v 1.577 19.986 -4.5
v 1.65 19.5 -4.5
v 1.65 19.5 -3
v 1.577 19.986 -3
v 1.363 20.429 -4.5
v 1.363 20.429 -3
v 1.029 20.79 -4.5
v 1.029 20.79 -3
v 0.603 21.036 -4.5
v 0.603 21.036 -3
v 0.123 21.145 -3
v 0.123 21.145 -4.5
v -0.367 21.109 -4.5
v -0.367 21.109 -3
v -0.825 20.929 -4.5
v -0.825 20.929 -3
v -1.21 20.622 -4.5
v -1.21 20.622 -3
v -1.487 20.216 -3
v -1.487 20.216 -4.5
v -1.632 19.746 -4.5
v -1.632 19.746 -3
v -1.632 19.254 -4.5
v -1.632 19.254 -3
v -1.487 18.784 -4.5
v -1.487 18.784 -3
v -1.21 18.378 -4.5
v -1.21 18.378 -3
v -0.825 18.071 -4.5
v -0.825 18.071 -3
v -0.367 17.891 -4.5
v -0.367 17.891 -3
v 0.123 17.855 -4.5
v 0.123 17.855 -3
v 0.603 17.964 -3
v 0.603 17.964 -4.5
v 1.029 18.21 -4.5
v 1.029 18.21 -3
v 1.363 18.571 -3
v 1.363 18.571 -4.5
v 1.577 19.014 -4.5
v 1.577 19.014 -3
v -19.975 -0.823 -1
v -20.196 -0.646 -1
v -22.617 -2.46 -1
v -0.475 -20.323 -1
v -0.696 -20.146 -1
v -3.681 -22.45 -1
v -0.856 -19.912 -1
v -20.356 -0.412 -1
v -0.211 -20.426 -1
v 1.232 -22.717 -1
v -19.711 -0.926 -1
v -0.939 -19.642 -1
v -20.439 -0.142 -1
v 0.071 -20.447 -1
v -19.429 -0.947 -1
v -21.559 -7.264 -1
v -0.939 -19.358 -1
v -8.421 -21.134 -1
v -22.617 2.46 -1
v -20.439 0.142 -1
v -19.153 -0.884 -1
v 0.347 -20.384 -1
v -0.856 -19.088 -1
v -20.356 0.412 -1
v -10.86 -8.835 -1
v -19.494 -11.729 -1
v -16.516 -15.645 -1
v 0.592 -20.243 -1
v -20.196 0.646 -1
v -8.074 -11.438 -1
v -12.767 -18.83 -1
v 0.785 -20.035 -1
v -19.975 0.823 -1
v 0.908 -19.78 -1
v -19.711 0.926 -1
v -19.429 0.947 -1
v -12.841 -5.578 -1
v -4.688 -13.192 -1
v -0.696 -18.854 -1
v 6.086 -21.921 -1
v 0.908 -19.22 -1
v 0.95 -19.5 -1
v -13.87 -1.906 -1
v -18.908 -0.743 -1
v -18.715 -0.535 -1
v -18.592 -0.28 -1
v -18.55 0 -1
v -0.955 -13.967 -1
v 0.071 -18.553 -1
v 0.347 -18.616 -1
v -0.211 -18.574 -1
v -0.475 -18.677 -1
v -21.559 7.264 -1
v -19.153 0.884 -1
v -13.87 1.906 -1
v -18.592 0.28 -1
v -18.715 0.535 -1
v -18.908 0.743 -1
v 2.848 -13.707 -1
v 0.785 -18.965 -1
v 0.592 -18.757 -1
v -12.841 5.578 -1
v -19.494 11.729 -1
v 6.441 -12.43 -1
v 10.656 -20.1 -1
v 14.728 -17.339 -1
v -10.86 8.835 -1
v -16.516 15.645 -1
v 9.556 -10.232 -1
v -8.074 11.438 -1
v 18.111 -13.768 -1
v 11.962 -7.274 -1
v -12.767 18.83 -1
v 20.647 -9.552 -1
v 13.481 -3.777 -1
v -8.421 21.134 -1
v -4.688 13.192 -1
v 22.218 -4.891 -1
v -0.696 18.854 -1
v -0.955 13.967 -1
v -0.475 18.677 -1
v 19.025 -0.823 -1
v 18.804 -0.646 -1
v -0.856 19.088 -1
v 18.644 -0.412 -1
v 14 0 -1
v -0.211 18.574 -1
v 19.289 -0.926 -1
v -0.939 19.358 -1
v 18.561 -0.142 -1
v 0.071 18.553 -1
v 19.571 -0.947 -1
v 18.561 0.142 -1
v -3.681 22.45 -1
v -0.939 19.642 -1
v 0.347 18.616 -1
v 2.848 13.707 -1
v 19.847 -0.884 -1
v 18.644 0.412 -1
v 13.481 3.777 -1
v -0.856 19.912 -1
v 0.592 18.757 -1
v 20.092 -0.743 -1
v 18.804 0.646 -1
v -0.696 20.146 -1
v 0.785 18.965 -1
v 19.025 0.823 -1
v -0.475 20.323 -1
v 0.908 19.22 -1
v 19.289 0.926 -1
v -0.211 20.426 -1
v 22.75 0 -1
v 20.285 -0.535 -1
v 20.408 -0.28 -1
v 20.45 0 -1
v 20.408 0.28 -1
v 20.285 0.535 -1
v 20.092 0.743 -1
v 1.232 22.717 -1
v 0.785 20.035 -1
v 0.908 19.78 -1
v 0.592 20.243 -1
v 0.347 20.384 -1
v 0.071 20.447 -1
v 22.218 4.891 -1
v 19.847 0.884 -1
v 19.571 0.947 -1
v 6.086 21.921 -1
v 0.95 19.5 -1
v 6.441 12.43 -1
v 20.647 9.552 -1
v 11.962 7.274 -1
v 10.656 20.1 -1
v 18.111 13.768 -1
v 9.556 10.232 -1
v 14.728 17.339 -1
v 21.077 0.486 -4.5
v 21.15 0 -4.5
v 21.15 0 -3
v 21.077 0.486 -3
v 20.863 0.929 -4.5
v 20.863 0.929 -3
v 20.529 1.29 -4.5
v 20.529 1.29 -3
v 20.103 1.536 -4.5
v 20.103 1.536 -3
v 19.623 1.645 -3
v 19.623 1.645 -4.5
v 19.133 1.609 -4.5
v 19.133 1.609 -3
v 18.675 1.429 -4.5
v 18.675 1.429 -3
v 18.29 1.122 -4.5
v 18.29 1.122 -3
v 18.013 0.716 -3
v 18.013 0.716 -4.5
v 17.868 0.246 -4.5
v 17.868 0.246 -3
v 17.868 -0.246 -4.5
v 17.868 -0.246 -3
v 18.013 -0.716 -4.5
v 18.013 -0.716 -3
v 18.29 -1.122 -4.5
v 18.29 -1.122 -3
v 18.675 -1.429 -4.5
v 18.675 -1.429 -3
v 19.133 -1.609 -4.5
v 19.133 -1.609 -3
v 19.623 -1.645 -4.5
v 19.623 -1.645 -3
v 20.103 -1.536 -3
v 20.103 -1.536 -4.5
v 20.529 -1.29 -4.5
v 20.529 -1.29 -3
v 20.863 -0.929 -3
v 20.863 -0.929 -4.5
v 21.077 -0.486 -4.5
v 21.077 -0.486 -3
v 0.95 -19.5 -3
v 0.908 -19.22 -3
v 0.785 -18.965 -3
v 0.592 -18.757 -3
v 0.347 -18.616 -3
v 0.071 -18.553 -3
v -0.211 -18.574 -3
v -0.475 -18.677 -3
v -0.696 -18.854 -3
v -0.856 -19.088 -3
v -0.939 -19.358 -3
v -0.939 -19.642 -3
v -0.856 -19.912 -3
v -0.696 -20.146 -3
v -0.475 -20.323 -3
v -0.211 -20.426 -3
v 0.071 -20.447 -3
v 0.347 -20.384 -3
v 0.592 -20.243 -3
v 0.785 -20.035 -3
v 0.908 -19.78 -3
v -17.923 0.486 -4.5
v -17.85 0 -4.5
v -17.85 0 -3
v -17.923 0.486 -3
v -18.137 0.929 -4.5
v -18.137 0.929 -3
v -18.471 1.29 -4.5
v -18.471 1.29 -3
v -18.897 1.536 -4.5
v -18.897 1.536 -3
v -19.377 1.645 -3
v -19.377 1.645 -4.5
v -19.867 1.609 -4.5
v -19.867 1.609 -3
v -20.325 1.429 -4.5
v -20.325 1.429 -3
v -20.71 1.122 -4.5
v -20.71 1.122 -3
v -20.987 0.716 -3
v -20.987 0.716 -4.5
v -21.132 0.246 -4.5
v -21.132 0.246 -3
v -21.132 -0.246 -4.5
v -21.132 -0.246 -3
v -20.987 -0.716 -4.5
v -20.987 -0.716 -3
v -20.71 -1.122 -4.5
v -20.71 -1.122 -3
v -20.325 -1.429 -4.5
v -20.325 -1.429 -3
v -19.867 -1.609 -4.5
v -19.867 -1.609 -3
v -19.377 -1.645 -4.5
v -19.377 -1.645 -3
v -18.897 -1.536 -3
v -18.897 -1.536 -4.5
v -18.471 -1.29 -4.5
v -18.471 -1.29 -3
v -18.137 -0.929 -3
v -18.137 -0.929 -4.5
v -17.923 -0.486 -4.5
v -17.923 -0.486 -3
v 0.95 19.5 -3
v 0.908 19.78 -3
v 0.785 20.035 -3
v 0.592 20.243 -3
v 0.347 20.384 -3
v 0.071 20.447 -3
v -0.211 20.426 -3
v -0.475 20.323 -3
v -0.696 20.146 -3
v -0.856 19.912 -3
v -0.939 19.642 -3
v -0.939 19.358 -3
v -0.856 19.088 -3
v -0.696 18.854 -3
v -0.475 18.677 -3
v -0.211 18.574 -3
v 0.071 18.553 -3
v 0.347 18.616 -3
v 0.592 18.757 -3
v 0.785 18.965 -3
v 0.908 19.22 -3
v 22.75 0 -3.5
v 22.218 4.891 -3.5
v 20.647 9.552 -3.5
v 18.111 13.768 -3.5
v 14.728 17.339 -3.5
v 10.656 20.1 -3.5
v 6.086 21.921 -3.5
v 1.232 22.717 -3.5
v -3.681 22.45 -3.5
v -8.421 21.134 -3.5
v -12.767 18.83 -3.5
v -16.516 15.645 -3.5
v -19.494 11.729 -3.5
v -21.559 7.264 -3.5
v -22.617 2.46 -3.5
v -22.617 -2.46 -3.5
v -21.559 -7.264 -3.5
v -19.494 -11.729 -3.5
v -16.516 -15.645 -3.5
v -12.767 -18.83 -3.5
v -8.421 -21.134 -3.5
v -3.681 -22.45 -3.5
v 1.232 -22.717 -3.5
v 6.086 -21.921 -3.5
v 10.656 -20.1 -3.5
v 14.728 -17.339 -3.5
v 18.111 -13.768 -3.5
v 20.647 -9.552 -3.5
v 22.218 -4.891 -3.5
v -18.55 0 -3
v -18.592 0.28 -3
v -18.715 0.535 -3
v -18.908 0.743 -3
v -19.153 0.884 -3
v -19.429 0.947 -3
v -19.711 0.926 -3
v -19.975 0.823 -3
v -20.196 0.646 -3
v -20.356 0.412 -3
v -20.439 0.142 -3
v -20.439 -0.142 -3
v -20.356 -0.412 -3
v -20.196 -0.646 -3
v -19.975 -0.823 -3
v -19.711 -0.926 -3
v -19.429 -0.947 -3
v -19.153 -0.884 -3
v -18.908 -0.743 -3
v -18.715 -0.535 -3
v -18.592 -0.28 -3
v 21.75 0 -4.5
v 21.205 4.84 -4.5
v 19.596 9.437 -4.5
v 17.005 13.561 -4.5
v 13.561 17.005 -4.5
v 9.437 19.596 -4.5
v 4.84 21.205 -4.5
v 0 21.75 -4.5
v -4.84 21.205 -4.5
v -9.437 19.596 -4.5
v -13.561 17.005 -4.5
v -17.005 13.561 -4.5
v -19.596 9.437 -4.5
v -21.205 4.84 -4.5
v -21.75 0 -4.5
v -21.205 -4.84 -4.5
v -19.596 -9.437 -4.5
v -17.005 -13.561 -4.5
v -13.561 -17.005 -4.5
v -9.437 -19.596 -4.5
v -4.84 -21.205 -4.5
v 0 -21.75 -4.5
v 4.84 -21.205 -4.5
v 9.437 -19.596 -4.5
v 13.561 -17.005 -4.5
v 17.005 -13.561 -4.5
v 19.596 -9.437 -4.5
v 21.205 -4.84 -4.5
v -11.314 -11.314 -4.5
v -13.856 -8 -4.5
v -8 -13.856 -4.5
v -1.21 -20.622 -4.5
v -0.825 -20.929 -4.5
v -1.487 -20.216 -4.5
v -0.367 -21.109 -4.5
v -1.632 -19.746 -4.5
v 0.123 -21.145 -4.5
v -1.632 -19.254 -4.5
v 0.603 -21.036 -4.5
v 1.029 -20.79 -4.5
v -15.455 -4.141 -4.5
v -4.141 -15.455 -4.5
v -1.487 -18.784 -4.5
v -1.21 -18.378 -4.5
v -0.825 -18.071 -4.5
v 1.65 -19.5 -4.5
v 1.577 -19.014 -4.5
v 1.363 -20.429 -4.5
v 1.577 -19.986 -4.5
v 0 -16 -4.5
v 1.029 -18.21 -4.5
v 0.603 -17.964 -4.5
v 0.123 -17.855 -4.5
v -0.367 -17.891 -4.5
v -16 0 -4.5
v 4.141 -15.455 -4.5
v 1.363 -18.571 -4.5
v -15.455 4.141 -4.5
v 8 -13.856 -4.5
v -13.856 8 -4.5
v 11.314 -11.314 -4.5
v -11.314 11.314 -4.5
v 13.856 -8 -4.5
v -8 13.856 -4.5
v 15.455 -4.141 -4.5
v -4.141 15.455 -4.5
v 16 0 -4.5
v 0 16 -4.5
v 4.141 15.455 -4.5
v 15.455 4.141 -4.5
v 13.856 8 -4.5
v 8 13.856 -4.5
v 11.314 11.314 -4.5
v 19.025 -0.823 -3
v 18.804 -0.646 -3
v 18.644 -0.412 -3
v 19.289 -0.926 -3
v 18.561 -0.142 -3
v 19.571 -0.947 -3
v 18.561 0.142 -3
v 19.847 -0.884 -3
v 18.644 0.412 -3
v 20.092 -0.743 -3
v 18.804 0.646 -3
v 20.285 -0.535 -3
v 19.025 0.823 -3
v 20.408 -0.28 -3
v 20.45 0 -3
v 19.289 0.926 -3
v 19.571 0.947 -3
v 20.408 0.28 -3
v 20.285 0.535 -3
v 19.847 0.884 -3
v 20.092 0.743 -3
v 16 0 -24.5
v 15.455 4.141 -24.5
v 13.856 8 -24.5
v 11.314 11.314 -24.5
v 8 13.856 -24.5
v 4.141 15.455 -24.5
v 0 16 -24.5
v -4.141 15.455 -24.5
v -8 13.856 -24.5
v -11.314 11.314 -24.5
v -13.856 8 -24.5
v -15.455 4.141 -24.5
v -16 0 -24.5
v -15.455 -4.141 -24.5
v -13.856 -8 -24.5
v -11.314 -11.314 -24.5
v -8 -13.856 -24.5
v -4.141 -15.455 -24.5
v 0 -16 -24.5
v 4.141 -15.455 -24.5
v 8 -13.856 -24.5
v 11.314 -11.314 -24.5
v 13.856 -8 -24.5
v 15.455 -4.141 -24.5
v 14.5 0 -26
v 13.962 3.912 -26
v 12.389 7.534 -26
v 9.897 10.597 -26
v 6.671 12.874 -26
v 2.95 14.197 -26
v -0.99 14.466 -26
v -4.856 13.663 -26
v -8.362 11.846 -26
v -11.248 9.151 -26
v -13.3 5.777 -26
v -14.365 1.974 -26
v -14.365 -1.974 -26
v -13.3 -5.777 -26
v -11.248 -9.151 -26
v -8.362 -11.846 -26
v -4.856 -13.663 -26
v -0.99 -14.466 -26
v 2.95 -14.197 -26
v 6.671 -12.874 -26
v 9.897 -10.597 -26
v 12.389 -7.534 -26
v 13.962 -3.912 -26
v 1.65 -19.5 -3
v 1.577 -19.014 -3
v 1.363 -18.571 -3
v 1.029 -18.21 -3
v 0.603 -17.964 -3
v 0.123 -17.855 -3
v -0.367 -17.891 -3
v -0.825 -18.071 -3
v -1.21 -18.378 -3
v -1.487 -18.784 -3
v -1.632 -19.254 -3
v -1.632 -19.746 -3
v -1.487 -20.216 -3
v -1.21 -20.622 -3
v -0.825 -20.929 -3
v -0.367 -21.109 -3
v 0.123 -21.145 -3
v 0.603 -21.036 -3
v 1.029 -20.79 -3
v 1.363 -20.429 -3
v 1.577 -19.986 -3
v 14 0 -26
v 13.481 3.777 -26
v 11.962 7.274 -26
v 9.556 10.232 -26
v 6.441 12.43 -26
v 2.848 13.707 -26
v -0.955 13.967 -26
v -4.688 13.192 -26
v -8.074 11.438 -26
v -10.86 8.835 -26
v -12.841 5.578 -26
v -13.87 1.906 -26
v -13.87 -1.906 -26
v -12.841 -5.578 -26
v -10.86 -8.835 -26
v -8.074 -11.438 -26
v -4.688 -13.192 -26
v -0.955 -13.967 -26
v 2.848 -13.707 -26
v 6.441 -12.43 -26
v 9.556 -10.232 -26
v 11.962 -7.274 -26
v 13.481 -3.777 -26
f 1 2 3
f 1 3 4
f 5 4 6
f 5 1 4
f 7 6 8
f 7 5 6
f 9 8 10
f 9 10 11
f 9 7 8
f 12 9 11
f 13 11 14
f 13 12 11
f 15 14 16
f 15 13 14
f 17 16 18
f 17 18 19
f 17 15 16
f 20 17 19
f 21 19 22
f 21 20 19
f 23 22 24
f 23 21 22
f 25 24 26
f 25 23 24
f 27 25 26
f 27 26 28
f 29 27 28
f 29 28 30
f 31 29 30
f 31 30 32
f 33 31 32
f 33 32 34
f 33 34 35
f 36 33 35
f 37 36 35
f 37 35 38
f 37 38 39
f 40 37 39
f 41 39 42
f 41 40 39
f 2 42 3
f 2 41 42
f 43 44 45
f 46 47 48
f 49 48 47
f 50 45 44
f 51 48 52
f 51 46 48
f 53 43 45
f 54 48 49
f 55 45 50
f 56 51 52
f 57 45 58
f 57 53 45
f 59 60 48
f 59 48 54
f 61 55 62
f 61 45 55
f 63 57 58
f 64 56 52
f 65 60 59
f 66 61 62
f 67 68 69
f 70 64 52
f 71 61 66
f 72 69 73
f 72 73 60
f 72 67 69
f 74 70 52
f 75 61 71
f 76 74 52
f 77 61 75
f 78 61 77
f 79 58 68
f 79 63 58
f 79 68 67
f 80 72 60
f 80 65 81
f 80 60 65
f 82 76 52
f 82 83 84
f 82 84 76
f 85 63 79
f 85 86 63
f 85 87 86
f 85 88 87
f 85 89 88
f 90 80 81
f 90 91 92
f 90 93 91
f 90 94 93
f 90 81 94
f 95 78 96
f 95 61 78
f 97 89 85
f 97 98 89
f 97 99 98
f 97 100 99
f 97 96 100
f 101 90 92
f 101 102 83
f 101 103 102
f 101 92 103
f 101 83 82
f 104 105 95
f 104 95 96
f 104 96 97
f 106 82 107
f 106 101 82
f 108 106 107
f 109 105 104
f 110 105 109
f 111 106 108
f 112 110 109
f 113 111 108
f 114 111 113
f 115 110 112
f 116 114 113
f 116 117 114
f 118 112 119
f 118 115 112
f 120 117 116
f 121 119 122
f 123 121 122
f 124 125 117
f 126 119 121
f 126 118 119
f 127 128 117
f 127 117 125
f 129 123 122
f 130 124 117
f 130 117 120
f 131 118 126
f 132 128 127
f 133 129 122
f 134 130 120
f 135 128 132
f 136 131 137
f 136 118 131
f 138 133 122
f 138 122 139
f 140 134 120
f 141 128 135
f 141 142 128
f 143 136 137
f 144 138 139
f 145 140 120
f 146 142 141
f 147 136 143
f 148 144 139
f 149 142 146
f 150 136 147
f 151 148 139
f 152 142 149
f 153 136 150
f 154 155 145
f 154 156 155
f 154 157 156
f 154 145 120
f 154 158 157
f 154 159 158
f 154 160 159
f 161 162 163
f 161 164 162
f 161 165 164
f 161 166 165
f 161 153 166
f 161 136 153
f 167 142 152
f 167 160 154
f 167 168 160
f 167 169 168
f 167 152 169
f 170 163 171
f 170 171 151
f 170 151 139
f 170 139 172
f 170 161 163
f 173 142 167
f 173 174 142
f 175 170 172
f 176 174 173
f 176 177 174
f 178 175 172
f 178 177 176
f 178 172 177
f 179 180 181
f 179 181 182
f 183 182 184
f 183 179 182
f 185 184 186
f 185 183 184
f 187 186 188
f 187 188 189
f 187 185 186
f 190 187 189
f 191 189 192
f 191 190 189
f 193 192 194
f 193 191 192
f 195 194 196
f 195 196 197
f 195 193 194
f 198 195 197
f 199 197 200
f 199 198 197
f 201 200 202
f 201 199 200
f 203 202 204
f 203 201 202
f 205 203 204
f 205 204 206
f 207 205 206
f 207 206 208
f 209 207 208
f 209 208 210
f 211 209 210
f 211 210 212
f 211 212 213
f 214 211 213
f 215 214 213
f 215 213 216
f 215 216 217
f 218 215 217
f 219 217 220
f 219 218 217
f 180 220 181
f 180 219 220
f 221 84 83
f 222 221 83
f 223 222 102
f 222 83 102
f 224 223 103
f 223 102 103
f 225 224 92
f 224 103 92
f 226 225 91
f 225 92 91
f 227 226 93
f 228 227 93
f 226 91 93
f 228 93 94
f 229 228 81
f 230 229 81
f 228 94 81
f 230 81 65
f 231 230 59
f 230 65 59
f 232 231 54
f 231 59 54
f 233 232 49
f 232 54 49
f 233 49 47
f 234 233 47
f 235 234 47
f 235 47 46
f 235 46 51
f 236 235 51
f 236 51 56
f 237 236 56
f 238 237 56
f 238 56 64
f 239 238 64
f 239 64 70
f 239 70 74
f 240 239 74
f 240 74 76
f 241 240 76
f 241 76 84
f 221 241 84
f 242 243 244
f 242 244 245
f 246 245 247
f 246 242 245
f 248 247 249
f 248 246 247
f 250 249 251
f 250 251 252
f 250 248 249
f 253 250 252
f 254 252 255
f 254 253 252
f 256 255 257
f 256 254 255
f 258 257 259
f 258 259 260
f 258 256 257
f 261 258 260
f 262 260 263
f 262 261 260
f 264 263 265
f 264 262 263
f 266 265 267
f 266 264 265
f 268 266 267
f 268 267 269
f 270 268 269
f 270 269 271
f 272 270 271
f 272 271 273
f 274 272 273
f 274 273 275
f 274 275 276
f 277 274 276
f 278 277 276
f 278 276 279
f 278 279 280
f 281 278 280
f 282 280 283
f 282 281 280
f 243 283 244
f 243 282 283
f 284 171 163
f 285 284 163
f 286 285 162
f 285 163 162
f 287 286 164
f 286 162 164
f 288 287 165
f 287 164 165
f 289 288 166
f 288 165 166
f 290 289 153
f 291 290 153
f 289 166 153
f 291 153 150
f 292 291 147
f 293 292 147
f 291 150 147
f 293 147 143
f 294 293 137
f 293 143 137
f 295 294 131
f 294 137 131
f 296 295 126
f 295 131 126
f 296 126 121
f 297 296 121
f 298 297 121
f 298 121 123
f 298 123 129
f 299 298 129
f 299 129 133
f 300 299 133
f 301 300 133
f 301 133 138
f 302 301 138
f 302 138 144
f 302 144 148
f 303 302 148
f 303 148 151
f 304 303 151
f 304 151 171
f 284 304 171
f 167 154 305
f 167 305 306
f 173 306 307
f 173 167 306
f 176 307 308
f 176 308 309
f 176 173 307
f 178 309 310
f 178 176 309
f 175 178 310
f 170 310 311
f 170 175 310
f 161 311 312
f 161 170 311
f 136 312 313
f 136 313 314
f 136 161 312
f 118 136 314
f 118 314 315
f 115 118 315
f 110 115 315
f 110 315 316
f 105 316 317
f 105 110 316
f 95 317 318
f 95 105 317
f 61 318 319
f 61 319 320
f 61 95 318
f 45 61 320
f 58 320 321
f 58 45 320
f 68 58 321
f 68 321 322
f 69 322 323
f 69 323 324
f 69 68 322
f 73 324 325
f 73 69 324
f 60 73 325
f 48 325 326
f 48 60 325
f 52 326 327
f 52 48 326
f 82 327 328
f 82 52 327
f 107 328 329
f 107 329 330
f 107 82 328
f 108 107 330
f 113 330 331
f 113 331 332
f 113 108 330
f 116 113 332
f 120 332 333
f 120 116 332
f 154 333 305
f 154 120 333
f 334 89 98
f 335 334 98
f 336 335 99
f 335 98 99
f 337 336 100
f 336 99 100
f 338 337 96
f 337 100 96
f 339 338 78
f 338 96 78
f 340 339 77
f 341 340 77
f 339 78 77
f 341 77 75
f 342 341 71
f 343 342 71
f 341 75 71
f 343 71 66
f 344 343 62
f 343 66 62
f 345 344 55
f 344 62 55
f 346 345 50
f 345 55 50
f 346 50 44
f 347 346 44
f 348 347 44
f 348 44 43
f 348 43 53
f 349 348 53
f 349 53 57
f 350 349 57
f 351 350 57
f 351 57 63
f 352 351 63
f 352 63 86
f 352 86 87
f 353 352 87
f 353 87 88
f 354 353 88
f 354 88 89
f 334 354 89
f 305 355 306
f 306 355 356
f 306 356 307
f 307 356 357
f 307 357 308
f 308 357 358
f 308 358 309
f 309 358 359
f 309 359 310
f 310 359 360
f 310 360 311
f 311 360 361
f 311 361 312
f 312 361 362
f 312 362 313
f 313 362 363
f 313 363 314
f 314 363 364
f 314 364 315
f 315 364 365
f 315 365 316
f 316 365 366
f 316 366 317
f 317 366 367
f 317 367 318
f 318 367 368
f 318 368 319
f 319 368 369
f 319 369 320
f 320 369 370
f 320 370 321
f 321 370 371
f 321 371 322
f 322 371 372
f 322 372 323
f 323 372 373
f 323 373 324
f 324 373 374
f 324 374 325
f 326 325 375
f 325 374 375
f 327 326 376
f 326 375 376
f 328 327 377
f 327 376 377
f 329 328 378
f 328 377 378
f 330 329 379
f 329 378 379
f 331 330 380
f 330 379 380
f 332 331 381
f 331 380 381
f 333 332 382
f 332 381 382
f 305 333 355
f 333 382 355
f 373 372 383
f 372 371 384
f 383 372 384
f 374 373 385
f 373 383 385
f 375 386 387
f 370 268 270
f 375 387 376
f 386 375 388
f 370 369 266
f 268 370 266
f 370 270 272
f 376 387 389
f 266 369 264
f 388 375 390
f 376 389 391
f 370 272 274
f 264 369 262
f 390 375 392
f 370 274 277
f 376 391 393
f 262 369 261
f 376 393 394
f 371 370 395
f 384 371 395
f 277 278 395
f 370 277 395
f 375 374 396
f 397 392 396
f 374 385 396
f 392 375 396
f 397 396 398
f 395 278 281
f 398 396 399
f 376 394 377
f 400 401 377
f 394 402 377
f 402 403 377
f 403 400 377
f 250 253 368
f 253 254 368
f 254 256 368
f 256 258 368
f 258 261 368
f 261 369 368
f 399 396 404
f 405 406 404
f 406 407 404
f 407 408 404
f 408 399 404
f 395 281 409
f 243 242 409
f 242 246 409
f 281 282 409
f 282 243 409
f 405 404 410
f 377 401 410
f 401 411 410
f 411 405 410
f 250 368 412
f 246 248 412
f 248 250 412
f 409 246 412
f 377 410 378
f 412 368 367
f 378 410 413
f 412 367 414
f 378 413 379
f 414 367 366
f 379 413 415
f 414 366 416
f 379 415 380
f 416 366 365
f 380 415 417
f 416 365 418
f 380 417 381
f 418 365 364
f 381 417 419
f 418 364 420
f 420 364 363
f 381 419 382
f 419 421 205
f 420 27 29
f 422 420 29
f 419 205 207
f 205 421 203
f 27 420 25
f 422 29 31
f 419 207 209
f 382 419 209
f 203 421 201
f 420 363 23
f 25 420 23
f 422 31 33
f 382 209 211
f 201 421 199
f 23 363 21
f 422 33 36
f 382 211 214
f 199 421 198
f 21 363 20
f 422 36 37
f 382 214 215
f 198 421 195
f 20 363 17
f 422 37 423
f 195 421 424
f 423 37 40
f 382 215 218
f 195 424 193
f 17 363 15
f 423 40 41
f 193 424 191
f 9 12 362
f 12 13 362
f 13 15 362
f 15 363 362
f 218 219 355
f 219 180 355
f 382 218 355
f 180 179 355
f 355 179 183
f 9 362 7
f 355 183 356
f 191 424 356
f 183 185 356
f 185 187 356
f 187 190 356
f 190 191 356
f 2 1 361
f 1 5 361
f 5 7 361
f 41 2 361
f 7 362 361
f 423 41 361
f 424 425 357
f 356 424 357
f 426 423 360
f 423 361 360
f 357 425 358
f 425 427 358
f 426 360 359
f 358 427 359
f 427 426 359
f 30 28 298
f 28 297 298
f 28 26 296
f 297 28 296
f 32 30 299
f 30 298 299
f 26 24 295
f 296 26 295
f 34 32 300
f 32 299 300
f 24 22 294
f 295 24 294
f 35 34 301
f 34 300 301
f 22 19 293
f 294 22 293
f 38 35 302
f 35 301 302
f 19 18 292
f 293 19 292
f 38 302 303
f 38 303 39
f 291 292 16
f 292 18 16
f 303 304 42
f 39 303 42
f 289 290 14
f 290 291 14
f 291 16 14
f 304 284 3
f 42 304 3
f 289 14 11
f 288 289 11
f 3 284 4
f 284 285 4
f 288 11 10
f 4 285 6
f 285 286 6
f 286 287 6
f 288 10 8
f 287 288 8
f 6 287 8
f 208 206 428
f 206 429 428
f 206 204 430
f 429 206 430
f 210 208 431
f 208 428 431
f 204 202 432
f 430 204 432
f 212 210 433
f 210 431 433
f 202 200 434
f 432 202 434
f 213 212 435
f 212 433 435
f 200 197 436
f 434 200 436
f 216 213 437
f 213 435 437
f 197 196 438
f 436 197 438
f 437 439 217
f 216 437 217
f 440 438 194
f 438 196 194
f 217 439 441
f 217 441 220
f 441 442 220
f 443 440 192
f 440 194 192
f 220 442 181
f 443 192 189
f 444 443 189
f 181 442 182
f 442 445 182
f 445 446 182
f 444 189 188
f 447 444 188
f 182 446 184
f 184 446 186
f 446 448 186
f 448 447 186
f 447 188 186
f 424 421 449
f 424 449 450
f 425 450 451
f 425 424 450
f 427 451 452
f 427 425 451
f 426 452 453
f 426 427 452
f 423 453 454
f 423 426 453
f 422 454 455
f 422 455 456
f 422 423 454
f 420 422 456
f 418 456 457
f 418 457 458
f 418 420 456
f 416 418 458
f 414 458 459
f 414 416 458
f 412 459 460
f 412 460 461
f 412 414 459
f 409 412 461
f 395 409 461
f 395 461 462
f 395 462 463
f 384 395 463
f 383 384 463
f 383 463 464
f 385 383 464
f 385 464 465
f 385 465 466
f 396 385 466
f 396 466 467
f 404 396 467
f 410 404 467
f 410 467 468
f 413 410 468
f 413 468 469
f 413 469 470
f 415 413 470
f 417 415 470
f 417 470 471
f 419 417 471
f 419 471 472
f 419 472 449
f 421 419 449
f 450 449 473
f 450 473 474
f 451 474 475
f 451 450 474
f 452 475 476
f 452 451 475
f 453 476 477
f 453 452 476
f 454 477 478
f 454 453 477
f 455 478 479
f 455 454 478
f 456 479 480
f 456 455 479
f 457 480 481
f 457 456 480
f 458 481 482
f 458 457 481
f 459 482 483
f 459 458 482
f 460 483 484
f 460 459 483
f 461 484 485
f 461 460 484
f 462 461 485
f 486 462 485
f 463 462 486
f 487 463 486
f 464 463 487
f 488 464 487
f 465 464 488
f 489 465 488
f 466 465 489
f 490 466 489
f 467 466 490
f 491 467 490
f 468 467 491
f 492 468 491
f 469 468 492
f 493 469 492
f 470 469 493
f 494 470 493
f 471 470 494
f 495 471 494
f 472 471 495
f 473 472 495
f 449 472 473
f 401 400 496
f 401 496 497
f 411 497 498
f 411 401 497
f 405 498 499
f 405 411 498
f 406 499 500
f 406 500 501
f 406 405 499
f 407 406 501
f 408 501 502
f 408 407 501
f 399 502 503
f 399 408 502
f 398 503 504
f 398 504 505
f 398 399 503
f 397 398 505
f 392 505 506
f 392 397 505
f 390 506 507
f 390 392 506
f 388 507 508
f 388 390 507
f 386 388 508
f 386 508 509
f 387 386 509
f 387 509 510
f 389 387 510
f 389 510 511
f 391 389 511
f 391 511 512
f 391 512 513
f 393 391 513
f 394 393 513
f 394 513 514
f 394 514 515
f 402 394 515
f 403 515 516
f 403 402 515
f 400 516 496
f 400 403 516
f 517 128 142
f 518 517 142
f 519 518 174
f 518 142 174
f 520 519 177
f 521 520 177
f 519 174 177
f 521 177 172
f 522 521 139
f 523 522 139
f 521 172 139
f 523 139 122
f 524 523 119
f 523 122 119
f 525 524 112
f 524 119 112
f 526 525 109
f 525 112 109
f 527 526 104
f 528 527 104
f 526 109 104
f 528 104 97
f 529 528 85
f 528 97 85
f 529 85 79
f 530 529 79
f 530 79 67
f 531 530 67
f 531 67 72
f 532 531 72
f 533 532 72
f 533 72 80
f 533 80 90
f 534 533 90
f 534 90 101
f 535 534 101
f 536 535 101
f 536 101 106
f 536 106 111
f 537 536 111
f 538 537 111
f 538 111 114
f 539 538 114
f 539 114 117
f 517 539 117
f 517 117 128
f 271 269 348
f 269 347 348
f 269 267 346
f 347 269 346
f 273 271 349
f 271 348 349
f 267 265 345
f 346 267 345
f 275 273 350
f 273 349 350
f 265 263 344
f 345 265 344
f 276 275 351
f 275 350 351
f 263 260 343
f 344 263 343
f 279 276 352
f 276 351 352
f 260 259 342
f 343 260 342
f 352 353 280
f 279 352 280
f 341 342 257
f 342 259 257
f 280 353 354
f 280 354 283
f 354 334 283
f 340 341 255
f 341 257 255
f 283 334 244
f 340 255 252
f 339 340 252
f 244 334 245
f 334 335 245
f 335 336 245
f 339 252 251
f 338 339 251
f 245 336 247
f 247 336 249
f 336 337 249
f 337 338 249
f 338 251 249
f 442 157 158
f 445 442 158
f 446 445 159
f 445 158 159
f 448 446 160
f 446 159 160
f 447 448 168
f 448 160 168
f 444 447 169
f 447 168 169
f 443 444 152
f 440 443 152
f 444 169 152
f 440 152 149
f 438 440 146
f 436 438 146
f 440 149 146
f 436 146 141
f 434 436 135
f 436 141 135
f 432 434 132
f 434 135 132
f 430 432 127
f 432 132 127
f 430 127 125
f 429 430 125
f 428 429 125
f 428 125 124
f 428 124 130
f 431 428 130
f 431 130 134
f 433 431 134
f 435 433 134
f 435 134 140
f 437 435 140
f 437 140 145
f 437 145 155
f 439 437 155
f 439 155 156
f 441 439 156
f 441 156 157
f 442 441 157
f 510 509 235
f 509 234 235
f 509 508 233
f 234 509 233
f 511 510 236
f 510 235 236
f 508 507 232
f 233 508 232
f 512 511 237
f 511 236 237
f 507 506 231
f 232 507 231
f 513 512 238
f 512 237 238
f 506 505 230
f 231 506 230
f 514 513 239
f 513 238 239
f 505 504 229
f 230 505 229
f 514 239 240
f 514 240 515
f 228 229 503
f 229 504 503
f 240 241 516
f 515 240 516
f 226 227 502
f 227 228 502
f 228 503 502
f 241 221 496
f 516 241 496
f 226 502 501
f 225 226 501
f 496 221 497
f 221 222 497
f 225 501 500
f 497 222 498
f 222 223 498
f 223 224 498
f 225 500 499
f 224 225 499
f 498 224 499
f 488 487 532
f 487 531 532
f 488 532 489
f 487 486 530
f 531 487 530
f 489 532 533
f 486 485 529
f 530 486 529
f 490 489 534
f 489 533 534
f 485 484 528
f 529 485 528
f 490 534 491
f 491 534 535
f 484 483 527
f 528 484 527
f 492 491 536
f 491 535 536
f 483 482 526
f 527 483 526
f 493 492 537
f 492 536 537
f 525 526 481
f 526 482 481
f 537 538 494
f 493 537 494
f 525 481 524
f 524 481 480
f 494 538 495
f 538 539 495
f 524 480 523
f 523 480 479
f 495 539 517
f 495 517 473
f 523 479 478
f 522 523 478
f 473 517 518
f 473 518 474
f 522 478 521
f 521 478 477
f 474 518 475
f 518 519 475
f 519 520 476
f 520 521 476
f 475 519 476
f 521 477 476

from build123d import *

# Parameters (mm, degrees)
SKETCH029_R     = 22.75
SKETCH029_R_2   = 14
PAD009_DEPTH    = 3.5
CHAMFER007_SIZE = 1
SKETCH026_R     = 16
SKETCH026_R_2   = 14
PAD010_DEPTH    = 25
SKETCH030_R     = 0.95
POCKET012_DEPTH = 3
SKETCH032_R     = 1.65
POCKET014_DEPTH = 1.5
CHAMFER011_SIZE = 1.5


with BuildPart() as part:
    # Sketch029 → Pad009 (new body)
    with BuildSketch(Plane.XY):
        Circle(SKETCH029_R)
        Circle(SKETCH029_R_2, mode=Mode.SUBTRACT)
    extrude(amount=-PAD009_DEPTH)

    # Chamfer007
    chamfer007_edges = [part.edges().sort_by_distance(p)[0] for p in [
        (-22.75, 0, -3.5),
    ]]
    chamfer(chamfer007_edges, length=CHAMFER007_SIZE)

    # Sketch026 → Pad010 (join)
    with BuildSketch(Plane.XY):
        Circle(SKETCH026_R)
        Circle(SKETCH026_R_2, mode=Mode.SUBTRACT)
    extrude(amount=-PAD010_DEPTH)

    # Sketch030 → Pocket012 (cut)
    with BuildSketch(Plane.XY):
        with Locations((-19.5, 0)):
            Circle(SKETCH030_R)
        with Locations((0, -19.5)):
            Circle(SKETCH030_R)
        with Locations((19.5, 0)):
            Circle(SKETCH030_R)
        with Locations((0, 19.5)):
            Circle(SKETCH030_R)
    extrude(amount=-POCKET012_DEPTH, mode=Mode.SUBTRACT)

    # Sketch032 → Pocket014 (cut)
    with BuildSketch(Plane.XY.offset(-3.5)):
        with Locations((-19.5, 0)):
            Circle(SKETCH032_R)
        with Locations((0, -19.5)):
            Circle(SKETCH032_R)
        with Locations((19.5, 0)):
            Circle(SKETCH032_R)
        with Locations((0, 19.5)):
            Circle(SKETCH032_R)
    extrude(amount=POCKET014_DEPTH, mode=Mode.SUBTRACT)

    # Chamfer011
    chamfer011_edges = [part.edges().sort_by_distance(p)[0] for p in [
        (-16, 0, -25),
    ]]
    chamfer(chamfer011_edges, length=CHAMFER011_SIZE)


with BuildPart() as part_1:
    # Body006 placement: moved
    add(part.part.moved(Location((0, 0, -1))))


solid = part_1.part
